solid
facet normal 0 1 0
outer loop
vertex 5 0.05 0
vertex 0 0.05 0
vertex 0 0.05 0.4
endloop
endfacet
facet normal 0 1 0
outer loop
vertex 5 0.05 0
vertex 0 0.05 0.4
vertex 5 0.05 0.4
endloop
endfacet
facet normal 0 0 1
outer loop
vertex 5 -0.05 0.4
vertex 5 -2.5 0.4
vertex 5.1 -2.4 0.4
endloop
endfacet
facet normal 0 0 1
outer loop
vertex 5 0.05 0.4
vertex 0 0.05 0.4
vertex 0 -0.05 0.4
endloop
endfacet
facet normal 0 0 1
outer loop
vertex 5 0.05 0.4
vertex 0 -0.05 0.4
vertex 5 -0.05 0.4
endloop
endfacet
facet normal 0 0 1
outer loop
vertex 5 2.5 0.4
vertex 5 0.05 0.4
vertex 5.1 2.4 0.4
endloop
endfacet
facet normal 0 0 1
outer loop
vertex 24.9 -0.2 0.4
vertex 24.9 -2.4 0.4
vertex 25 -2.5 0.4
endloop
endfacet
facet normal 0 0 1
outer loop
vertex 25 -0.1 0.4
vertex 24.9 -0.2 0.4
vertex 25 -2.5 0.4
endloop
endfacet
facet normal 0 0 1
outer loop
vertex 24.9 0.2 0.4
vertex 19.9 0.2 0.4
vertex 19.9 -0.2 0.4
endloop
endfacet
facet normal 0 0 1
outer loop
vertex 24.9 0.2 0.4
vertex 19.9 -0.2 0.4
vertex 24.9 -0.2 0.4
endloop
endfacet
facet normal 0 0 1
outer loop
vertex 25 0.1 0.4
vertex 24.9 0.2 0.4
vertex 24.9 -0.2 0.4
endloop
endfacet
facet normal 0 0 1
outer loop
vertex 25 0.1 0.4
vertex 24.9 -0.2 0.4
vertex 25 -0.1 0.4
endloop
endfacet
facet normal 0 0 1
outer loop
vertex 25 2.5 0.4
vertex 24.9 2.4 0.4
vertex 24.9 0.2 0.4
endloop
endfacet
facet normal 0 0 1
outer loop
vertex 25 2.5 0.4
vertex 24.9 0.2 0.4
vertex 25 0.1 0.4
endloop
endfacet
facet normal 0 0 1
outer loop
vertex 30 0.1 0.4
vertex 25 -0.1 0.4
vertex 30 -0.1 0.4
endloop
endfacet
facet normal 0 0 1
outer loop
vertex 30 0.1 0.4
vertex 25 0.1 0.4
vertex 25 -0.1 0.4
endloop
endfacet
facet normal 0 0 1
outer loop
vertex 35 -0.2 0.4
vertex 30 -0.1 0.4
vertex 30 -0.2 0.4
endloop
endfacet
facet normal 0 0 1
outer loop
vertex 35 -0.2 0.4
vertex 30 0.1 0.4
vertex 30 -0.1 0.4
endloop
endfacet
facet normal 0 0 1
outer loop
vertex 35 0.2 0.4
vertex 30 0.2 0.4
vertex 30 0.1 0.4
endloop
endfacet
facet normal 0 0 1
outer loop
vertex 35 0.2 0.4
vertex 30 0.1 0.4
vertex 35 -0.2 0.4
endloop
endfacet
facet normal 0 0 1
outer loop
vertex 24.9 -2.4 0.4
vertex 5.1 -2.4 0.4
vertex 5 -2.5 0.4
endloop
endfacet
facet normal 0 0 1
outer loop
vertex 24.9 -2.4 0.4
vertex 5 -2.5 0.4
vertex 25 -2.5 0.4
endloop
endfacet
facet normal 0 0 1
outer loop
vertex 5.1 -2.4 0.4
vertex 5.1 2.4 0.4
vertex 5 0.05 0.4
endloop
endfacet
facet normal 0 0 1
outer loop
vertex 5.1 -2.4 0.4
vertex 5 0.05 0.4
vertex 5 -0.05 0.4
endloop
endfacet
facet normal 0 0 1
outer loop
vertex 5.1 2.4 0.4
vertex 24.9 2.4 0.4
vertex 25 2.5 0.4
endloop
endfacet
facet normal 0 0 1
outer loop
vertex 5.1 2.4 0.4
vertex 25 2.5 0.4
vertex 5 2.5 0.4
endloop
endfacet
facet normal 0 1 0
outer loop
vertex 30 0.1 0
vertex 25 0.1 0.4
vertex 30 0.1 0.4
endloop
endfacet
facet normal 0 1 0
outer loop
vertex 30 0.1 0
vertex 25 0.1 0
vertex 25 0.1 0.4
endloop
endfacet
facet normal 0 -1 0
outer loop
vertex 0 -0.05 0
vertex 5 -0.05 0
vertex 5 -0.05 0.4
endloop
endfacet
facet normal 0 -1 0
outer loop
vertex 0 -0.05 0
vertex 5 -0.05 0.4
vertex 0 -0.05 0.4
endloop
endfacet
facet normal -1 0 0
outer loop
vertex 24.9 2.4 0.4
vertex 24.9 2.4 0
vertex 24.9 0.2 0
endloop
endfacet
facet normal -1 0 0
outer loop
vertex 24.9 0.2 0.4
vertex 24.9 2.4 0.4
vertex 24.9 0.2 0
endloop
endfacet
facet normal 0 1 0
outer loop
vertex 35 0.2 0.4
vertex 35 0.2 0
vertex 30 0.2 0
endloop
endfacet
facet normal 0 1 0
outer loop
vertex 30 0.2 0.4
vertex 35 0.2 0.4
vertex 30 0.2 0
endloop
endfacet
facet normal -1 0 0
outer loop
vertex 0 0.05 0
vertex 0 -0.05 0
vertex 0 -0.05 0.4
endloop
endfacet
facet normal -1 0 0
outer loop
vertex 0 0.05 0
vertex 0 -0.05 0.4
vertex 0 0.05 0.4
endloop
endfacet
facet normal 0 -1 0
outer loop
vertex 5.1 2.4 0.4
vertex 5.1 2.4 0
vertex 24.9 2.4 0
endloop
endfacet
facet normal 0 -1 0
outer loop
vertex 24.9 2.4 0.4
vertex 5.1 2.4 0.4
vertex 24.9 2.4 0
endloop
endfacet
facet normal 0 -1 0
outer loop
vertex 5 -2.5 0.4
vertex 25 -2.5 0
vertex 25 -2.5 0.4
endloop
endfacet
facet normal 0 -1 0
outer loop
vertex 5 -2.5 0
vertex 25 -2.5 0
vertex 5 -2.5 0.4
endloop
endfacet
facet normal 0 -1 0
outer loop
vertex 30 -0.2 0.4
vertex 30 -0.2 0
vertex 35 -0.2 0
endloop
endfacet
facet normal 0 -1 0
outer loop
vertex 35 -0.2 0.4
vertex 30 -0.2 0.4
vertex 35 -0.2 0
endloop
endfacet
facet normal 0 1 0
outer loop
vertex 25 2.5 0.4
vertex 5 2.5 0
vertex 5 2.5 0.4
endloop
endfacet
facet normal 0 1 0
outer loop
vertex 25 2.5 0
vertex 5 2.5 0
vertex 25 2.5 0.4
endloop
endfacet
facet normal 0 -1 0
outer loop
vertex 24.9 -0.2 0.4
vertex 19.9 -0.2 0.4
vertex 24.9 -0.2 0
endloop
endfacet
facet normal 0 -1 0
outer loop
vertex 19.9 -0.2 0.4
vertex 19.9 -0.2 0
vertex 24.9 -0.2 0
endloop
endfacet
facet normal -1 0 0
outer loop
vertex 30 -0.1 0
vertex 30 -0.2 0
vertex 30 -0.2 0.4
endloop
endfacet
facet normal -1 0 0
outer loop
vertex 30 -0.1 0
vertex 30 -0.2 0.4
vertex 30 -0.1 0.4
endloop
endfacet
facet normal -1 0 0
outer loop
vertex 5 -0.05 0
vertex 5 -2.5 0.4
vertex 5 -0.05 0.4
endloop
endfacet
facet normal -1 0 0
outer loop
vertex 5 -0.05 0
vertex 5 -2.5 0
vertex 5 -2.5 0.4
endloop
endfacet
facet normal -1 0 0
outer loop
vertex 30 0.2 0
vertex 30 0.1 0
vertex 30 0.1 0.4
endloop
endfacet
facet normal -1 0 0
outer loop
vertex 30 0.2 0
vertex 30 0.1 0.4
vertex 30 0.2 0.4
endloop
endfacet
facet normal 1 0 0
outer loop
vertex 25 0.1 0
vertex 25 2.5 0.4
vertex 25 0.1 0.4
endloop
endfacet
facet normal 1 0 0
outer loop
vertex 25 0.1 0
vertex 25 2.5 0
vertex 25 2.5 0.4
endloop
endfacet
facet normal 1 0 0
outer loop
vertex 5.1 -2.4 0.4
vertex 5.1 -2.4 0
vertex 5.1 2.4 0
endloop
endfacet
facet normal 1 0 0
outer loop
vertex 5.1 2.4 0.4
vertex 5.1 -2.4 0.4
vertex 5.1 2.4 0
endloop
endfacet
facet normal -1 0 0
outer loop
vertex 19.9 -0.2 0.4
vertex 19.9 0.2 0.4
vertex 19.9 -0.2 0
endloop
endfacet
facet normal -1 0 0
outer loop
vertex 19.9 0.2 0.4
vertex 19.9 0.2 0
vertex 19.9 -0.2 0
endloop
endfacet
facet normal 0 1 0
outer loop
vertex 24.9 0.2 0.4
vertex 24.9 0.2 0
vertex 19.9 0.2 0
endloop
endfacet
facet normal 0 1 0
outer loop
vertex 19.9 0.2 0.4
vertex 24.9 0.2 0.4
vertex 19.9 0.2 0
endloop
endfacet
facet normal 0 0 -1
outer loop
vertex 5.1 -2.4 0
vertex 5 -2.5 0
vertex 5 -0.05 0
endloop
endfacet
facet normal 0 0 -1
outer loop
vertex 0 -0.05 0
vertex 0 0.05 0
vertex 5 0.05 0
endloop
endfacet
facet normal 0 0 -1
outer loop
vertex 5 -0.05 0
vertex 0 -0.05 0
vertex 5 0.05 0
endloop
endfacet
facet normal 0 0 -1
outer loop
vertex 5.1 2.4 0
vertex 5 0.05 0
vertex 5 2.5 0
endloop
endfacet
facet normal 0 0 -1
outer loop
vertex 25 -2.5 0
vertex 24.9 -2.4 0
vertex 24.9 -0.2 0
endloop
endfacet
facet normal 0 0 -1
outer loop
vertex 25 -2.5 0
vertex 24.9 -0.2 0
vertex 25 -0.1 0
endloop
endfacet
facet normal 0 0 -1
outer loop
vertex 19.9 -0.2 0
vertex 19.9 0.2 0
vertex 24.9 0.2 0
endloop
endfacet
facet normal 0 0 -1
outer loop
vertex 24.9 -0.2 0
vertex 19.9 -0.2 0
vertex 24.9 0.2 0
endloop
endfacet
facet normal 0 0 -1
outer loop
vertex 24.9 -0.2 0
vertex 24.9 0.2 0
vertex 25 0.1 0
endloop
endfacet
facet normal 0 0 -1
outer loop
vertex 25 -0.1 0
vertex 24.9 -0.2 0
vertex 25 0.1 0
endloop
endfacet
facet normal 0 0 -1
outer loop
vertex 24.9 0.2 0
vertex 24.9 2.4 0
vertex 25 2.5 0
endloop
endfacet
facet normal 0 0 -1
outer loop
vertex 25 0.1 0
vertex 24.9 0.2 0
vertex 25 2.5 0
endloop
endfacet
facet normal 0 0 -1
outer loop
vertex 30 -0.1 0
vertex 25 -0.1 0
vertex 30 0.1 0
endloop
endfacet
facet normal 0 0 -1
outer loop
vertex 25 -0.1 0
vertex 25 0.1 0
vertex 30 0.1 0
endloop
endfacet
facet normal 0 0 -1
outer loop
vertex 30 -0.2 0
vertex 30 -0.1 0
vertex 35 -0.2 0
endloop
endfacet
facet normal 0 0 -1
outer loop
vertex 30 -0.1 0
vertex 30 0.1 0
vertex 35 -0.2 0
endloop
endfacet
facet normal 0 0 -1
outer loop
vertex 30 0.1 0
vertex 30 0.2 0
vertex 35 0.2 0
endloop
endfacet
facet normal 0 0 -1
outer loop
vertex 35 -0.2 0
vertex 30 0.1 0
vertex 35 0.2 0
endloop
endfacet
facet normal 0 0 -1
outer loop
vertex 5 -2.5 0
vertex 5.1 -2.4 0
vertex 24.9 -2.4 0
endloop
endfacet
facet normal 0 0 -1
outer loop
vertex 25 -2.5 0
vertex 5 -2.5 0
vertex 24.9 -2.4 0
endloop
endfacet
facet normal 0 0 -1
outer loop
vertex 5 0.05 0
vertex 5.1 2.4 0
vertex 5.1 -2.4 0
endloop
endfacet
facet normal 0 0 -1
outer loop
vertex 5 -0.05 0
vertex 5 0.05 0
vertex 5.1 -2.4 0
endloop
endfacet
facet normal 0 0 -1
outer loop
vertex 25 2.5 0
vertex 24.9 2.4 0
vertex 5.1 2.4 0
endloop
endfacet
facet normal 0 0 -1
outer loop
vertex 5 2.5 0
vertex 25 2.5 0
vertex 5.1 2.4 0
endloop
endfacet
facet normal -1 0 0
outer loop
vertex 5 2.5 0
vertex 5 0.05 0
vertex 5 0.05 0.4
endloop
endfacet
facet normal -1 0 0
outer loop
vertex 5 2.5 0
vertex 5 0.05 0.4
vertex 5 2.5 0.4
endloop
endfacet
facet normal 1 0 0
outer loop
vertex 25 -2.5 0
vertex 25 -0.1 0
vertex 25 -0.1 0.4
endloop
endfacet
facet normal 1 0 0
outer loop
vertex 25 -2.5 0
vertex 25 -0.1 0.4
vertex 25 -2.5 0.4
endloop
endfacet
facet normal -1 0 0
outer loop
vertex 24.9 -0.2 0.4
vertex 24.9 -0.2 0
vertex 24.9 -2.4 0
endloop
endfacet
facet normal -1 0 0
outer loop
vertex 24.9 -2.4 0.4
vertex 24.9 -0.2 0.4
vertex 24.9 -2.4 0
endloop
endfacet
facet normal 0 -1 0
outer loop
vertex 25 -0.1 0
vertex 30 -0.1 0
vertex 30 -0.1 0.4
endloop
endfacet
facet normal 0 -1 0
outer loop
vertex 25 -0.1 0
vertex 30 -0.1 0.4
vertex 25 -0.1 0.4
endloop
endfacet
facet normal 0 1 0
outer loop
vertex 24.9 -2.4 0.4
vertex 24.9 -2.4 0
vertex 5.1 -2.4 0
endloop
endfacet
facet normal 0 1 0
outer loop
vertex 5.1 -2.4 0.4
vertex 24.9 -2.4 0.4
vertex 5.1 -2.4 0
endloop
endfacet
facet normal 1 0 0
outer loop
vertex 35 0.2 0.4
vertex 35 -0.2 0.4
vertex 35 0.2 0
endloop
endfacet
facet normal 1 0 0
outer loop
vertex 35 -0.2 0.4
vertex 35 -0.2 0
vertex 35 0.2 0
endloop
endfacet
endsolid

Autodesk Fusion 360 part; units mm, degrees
sketch "Sketch1" plane through (0, 0, 0) normal (0, 0, 1) x (1, 0, 0)
  line L0 (0, 0.05) -> (5, 0.05)
  line L1 (5, 0.05) -> (5, -0.05) construction
  line L2 (5, -0.05) -> (0, -0.05)
  line L3 (0, -0.05) -> (0, 0.05)
  line L4 (5, 0.05) -> (5, 2.5)
  line L5 (5, 2.5) -> (25, 2.5)
  line L6 (25, 2.5) -> (25, 0.1)
  line L7 (25, 0.1) -> (30, 0.1)
  line L8 (30, -0.1) -> (25, -0.1)
  line L9 (25, -0.1) -> (25, -2.5)
  line L10 (25, -2.5) -> (5, -2.5)
  line L11 (5, -2.5) -> (5, -0.05)
  line L12 (30, 0.1) -> (30, 0.2)
  line L13 (19.9, 0.2) -> (19.9, -0.2)
  line L14 (30, -0.4037) -> (30, -0.1)
  line L15 (5.1, 2.4) -> (24.9, 2.4)
  line L16 (24.9, 2.4) -> (24.9, 0.2)
  line L17 (24.9, 0.2) -> (19.9, 0.2)
  line L18 (19.9, 0.2) -> (19.9, -0.2)
  line L19 (19.9, -0.2) -> (24.9, -0.2)
  line L20 (24.9, -0.2) -> (24.9, -2.4)
  line L21 (24.9, -2.4) -> (5.1, -2.4)
  line L22 (5.1, -2.4) -> (5.1, 2.4)
  line L23 (24.9, 0.2) -> (19.9, 0.2)
  line L24 (25, 0.2) -> (24.9, 0.2) construction
  line L25 (19.9, -0.2) -> (24.9, -0.2)
  line L26 (24.9, -0.2) -> (25, -0.6007) construction
  line L27 (30, -0.1) -> (30, -0.2)
  line L28 (30, -0.2) -> (35, -0.2)
  line L29 (35, -0.2) -> (35, 0.2)
  line L30 (35, 0.2) -> (30, 0.2)
  line L31 (30, 0.2) -> (30, 0.1)
  point P0 (19.9, 0)
  point P1 (35, 0)
  dimension "d56" = 0.1
  dimension "d57" = 5
  dimension "d58" = 0.2
  dimension "d59" = 5
  dimension "d60" = 5
  dimension "d64" = 0.1
  dimension "d65" = 0.1
  dimension "d66" = 0.1
  dimension "d67" = 0.1
  dimension "d68" = 0.4
  dimension "d70" = 0.2
  dimension "d71" = 5
  dimension "d72" = 20
  dimension "d73" = 5
  dimension "d74" = 0.1
  dimension "d76" = 5
  dimension "d77" = 0.4
  dimension "d78" = 0.2
  dimension "spacer" = 5
  dimension "d80" = 0.1
  dimension "d81" = 2.5
extrude "Extrude2" add sketch "Sketch1" along normal blind 0.4
equation "d1000 = channelwidth"
equation "d11 = d1000 * 2.2"
equation "d1001 = depth"
equation "mouth_user = 0.1 mm" comment "User entered value."
equation "mouth_size = d1000 + 0.5 mm" comment "Multiplier to user entered value"
equation "channelwidth = 0.1 mm"
equation "depth = 0.4 mm"
equation "length = 20 mm"
equation "neckwidth = 0.2 mm"
equation "inputwidth = neckwidth * 2"
equation "outletwidth = inputwidth"
equation "necklength = 5 mm"
equation "d56 = channelwidth"
equation "d57 = spacer"
equation "d58 = neckwidth"
equation "d59 = necklength"
equation "d60 = necklength"
equation "d64 = channelwidth"
equation "d65 = channelwidth"
equation "d66 = channelwidth"
equation "d67 = channelwidth"
equation "d68 = inputwidth"
equation "d70 = inputwidth / 2"
equation "d71 = inputlength"
equation "d72 = length"
equation "d74 = channelwidth"
equation "d76 = inputlength"
equation "d77 = outletwidth"
equation "d78 = outletwidth / 2"
equation "d80 = neckwidth / 2"
equation "d81 = d73 / 2"
equation "inputlength = 5 mm"
